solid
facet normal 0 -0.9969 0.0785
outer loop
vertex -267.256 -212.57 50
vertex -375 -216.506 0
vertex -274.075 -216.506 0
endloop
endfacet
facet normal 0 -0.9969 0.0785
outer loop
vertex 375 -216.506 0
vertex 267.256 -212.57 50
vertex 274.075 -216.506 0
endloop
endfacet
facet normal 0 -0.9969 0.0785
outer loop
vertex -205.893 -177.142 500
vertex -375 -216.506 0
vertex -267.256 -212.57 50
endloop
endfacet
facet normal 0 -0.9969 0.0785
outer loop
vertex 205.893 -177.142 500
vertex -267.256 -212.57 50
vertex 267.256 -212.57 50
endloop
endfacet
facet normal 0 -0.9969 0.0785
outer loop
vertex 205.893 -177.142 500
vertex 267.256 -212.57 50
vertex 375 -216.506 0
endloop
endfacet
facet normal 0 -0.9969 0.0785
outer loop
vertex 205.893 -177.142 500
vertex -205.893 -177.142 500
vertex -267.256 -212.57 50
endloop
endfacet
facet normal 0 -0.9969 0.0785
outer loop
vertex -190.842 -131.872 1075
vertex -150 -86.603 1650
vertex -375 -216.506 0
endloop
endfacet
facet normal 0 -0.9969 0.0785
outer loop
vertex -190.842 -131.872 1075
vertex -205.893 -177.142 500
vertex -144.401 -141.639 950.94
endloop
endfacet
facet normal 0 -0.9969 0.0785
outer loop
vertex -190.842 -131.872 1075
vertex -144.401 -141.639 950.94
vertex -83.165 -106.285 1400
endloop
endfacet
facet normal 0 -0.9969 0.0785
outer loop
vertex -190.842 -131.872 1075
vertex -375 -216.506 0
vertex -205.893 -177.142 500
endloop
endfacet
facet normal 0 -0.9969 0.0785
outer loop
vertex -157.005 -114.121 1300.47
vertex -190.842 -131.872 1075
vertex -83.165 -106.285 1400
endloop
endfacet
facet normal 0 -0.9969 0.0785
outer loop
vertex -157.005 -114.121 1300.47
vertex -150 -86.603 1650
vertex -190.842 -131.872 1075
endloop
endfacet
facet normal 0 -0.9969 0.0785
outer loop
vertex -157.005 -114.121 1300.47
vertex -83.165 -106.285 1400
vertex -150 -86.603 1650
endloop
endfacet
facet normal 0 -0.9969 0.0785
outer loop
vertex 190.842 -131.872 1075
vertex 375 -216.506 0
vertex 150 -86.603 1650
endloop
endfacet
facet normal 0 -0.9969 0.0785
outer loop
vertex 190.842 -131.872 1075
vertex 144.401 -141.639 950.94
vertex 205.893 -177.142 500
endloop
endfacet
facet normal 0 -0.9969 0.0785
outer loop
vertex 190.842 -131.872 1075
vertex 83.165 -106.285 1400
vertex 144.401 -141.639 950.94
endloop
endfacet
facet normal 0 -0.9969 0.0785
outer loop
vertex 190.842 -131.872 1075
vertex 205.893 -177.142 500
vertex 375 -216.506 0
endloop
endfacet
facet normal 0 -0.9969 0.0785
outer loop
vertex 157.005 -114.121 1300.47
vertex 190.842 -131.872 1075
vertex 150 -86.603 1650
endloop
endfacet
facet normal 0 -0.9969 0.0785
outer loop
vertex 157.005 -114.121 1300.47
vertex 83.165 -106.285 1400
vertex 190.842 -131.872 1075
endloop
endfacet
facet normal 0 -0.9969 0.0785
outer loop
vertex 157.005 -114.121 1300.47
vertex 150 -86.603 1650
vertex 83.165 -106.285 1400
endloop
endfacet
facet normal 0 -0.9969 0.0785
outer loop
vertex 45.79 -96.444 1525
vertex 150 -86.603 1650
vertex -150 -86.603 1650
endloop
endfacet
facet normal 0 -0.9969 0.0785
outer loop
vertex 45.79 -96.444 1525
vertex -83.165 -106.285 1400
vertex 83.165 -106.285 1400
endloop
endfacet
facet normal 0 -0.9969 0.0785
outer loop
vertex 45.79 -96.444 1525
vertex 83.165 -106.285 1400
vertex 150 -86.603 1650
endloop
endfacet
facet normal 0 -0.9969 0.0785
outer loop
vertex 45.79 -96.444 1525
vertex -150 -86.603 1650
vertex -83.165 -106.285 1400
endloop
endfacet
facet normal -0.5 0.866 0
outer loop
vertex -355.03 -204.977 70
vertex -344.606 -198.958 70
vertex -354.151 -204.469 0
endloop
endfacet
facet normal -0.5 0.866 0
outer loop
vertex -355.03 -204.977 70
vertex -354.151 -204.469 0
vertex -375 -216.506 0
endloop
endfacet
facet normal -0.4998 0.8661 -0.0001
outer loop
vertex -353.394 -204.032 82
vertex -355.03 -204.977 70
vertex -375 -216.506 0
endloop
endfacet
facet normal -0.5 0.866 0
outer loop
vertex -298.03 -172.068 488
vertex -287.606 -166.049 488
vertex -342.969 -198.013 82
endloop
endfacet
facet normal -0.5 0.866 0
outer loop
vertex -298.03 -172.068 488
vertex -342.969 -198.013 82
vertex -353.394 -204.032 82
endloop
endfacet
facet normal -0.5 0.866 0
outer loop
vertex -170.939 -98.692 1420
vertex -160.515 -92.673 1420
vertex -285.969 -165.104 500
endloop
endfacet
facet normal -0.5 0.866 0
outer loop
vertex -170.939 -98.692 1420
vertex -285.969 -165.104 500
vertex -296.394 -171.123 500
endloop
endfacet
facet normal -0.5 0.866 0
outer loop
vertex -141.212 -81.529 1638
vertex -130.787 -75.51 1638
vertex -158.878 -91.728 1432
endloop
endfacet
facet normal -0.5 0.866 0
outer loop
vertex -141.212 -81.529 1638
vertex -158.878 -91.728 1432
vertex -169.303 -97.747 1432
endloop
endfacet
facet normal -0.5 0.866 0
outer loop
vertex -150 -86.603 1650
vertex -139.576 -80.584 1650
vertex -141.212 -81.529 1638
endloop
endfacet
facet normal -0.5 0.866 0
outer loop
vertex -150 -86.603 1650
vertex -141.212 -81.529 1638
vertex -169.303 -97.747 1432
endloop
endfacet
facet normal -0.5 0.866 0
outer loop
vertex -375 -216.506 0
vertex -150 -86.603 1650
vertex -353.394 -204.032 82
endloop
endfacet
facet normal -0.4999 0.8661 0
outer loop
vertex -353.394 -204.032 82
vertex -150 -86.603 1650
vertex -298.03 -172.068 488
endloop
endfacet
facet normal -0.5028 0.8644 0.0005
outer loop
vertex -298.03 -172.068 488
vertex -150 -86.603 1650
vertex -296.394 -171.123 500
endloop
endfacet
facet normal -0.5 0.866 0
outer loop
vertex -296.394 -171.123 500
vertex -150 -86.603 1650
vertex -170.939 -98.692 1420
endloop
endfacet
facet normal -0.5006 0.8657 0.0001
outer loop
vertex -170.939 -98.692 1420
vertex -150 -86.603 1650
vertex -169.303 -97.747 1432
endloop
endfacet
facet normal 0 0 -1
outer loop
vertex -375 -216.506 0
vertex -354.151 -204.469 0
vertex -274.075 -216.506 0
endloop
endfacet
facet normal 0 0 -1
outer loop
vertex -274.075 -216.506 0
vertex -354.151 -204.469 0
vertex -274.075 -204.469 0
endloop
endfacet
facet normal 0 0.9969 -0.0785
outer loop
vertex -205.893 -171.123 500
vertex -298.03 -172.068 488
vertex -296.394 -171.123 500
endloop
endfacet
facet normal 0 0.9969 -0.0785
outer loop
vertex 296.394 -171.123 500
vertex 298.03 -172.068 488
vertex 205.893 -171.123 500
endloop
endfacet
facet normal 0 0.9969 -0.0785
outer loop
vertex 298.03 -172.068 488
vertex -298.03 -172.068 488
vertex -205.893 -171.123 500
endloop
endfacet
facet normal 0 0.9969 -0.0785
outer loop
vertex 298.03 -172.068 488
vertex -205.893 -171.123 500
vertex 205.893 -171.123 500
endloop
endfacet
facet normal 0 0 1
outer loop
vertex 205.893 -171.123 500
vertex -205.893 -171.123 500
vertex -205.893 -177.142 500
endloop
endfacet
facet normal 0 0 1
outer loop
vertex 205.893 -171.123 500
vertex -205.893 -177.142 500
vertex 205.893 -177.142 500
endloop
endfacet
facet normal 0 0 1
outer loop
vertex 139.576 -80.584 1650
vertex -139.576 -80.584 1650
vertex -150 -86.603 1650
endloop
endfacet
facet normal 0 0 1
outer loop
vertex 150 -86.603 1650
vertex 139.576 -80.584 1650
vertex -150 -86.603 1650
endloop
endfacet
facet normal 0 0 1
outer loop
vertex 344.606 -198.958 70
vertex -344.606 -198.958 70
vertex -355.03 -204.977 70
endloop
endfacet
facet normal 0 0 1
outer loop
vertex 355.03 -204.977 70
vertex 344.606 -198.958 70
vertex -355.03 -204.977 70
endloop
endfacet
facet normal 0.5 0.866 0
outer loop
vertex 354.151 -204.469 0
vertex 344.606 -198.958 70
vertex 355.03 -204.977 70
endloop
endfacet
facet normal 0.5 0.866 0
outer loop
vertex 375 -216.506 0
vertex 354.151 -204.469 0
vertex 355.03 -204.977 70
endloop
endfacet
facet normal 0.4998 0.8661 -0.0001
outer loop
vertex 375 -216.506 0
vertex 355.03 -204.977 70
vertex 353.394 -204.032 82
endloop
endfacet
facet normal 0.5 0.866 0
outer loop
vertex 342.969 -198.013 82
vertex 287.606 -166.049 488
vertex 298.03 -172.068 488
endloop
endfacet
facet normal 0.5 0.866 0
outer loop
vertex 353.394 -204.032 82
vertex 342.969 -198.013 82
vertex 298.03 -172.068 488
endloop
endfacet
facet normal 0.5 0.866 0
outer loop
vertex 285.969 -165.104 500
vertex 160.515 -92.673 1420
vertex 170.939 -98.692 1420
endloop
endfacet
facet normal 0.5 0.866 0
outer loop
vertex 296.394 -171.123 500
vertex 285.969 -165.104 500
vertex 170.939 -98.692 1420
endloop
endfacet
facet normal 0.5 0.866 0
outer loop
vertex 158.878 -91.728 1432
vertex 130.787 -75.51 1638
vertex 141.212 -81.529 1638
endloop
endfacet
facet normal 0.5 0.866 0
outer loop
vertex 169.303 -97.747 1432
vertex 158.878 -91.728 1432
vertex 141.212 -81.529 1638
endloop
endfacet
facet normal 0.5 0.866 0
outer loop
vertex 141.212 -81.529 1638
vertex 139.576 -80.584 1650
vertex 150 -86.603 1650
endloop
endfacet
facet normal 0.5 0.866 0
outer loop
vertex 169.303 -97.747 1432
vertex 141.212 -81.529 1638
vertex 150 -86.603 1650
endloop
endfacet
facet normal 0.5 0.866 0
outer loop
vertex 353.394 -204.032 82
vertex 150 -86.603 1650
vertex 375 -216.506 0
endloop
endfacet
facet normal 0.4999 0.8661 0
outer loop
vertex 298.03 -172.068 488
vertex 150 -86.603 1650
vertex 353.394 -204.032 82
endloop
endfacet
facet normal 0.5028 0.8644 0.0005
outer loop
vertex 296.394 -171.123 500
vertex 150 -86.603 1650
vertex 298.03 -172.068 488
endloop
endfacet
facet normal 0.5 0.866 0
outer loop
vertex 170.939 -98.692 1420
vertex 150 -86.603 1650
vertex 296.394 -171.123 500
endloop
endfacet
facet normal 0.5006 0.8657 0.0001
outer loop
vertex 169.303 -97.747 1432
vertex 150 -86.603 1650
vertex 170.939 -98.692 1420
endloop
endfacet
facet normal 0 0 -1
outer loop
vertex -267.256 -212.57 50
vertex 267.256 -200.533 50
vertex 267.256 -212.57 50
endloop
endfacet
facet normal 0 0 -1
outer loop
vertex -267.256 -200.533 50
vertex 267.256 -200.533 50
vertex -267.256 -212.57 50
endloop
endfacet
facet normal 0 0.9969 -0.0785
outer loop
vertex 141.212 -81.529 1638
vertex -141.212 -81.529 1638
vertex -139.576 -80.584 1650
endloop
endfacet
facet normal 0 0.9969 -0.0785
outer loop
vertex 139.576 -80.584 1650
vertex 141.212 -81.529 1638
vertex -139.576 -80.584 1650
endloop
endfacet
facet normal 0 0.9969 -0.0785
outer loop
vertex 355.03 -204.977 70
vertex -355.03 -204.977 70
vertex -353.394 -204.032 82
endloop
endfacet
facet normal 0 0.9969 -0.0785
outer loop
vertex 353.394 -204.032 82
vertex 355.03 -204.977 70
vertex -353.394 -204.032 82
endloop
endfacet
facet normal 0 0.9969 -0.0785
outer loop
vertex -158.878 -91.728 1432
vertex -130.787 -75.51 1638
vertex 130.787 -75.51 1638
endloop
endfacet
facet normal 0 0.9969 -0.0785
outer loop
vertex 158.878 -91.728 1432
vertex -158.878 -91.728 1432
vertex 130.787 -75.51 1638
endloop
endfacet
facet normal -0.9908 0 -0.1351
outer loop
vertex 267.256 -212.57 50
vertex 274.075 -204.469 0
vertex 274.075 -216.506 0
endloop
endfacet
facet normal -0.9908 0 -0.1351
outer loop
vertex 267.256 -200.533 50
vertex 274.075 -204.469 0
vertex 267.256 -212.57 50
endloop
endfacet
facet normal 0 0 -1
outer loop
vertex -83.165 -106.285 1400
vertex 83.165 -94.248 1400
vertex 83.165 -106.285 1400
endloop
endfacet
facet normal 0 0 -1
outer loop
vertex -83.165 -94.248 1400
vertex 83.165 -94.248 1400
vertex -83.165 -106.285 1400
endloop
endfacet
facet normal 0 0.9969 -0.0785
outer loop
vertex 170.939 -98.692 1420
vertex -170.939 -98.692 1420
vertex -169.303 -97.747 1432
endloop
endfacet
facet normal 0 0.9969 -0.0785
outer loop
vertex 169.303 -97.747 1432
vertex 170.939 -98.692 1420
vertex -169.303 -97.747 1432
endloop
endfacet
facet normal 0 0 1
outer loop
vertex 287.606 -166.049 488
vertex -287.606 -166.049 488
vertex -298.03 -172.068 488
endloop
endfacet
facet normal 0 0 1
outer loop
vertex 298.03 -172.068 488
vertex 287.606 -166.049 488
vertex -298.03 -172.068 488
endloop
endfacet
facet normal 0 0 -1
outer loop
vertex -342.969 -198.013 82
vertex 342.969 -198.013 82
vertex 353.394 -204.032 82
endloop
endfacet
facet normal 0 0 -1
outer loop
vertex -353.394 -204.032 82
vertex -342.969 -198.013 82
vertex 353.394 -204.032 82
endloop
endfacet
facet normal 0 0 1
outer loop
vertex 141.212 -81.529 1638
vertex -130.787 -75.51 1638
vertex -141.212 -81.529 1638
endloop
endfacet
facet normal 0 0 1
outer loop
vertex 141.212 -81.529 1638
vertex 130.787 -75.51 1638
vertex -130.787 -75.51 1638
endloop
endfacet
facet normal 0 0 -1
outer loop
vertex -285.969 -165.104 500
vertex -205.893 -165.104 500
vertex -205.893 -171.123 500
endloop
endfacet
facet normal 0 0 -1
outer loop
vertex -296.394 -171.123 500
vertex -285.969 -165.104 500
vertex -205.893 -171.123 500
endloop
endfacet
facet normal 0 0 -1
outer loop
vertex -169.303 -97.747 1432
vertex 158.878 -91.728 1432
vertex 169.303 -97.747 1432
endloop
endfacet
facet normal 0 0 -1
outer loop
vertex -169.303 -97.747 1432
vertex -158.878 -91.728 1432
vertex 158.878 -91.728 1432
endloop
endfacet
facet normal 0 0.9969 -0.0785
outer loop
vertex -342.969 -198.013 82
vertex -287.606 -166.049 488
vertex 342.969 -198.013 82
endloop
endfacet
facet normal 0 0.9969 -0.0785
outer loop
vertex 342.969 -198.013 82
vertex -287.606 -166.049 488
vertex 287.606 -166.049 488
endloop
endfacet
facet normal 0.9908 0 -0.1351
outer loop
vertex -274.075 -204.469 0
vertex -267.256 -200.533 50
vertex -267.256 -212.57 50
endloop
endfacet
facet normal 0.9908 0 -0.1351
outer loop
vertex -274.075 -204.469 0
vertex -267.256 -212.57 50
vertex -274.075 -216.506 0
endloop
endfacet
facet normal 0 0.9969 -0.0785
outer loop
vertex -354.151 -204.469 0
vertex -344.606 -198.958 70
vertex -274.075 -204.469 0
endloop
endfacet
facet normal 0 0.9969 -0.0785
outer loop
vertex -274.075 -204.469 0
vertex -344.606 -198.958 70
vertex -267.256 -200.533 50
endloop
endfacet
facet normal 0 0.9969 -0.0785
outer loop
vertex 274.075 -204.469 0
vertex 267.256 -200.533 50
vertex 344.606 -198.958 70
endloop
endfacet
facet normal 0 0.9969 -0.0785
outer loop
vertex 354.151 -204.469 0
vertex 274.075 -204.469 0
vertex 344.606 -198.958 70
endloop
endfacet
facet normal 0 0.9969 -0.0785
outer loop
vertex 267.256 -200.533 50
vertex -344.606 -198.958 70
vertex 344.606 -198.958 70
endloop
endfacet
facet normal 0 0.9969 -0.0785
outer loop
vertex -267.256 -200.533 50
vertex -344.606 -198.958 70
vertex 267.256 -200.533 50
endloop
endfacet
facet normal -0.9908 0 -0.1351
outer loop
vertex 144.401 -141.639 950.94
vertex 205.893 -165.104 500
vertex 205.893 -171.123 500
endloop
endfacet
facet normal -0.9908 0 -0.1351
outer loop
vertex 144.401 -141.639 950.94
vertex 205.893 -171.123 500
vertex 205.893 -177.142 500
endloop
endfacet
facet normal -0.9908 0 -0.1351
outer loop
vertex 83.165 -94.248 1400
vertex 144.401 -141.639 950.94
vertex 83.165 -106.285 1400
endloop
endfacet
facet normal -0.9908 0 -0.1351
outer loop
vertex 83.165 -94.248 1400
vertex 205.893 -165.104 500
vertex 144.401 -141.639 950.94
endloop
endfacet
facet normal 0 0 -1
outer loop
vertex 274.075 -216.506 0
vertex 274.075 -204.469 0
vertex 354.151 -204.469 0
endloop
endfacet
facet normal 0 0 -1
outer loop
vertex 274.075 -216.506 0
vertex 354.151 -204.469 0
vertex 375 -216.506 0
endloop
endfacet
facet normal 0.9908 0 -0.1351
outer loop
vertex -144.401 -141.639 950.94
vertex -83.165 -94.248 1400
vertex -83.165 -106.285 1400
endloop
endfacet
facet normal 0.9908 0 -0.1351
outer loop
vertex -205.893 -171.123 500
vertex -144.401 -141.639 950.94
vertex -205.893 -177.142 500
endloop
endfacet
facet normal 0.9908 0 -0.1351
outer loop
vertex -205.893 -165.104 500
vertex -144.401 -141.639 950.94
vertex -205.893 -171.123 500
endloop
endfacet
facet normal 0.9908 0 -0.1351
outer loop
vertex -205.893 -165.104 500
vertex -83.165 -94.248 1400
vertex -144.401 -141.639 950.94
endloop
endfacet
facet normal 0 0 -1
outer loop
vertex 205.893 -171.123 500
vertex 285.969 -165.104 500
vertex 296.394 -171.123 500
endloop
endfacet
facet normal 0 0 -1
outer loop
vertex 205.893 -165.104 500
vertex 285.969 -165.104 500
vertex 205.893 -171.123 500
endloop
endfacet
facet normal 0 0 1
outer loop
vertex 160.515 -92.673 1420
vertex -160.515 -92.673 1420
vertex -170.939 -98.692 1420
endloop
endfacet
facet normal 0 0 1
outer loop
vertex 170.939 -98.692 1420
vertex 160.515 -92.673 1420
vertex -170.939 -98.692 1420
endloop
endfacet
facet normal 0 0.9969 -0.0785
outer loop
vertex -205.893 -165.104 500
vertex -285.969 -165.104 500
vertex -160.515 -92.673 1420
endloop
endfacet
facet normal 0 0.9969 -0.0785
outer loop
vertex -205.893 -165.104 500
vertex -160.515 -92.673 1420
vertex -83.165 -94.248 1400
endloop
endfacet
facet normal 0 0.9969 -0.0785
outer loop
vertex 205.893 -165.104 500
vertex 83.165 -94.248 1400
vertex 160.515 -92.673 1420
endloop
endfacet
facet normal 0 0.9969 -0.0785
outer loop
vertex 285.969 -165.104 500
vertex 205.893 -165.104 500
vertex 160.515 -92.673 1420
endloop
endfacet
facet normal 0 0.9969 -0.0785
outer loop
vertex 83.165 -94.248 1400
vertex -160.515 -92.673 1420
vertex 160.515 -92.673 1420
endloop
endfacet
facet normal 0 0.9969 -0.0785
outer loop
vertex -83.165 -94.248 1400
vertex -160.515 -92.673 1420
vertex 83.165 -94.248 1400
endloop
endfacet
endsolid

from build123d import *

# Parameters (mm, degrees)
F7_R      = 960.2431856589
F8_DEPTH  = 635.5163904251
F12_R     = 870.2287794889
F13_DEPTH = 25
F14_R     = 892.9375722879
F15_DEPTH = 25
F19_REACH = 935.9843056137
F20_DEPTH = 216.5073510461


with BuildPart() as f5:
    # F3 (on Top) → F5 section 0
    with BuildSketch(Plane.XY):
        Polygon((-375, -216.5063509461), (375, -216.5063509461), (0, 433.0127018922), align=None)
    # F4 (on line) → F5 section 1
    with BuildSketch(Plane.XY.offset(1650)):
        Polygon((-150, -86.6025403784), (150, -86.6025403784), (0, 173.2050807569), align=None)
    loft()

    # F7 (on face) → F8 (cut, through all)
    with BuildSketch(Plane(origin=(0, -203.2096543416, 15.9986111776), x_dir=(1, 0, 0), z_dir=(0, -0.9969151597, 0.078486714))):
        with Locations((0, 812.9688501358)):
            Circle(F7_R)
    extrude(amount=-F8_DEPTH, mode=Mode.SUBTRACT)

    # F12 (on face) → F13 (cut)
    with BuildSketch(Plane(origin=(0, 0, 0), x_dir=(0.8660254038, -0.5, 0), z_dir=(-0.5, -0.8660254038, 0))):
        with Locations((304.0688931942, 817.2121047974)):
            Circle(F12_R)
    extrude(amount=-F13_DEPTH, mode=Mode.SUBTRACT)

    # F14 (on face) → F15 (cut)
    with BuildSketch(Plane(origin=(0, 0, 0), x_dir=(-0.8660254038, -0.5, 0), z_dir=(-0.5, 0.8660254038, 0))):
        with Locations((291.6465699673, 811.1194968224)):
            Circle(F14_R)
    extrude(amount=F15_DEPTH, mode=Mode.SUBTRACT)

    f19_end = Plane(origin=(0, -155.5781982198, 697.4454188962), x_dir=(0, 0.078486714, 0.9969151597), z_dir=(0, 0.9969151597, -0.078486714))
    # F17 (on Front) → F19 (cut, up to a plane its end follows)
    with BuildSketch(Plane.XZ):
        Polygon((-181.3636363636, 1420), (181.3636363636, 1420), (179.7272727273, 1432), (-179.7272727273, 1432), align=None)
        Polygon((151.6363636364, 1638), (150, 1650), (-150, 1650), (-151.6363636364, 1638), align=None)
        Polygon((308.4545454545, 488), (306.8181818182, 500), (-306.8181818182, 500), (-308.4545454545, 488), align=None)
        Polygon((-365.4545454545, 70), (365.4545454545, 70), (363.8181818182, 82), (-363.8181818182, 82), align=None)
    f19_long = extrude(amount=F19_REACH, mode=Mode.PRIVATE)
    add(split(f19_long, bisect_by=f19_end, keep=Keep.TOP, mode=Mode.PRIVATE), mode=Mode.SUBTRACT)

    # F16 (on Front) → F20 (cut, through all)
    with BuildSketch(Plane.XZ):
        Polygon((-267.2563485856, 50), (-274.0745304038, 0), (274.0745304038, 0), (267.2563485856, 50), align=None)
        Polygon((-205.8927122219, 500), (205.8927122219, 500), (83.1654394947, 1400), (-83.1654394947, 1400), align=None)
    extrude(amount=F20_DEPTH, mode=Mode.SUBTRACT)


solid = f5.part
